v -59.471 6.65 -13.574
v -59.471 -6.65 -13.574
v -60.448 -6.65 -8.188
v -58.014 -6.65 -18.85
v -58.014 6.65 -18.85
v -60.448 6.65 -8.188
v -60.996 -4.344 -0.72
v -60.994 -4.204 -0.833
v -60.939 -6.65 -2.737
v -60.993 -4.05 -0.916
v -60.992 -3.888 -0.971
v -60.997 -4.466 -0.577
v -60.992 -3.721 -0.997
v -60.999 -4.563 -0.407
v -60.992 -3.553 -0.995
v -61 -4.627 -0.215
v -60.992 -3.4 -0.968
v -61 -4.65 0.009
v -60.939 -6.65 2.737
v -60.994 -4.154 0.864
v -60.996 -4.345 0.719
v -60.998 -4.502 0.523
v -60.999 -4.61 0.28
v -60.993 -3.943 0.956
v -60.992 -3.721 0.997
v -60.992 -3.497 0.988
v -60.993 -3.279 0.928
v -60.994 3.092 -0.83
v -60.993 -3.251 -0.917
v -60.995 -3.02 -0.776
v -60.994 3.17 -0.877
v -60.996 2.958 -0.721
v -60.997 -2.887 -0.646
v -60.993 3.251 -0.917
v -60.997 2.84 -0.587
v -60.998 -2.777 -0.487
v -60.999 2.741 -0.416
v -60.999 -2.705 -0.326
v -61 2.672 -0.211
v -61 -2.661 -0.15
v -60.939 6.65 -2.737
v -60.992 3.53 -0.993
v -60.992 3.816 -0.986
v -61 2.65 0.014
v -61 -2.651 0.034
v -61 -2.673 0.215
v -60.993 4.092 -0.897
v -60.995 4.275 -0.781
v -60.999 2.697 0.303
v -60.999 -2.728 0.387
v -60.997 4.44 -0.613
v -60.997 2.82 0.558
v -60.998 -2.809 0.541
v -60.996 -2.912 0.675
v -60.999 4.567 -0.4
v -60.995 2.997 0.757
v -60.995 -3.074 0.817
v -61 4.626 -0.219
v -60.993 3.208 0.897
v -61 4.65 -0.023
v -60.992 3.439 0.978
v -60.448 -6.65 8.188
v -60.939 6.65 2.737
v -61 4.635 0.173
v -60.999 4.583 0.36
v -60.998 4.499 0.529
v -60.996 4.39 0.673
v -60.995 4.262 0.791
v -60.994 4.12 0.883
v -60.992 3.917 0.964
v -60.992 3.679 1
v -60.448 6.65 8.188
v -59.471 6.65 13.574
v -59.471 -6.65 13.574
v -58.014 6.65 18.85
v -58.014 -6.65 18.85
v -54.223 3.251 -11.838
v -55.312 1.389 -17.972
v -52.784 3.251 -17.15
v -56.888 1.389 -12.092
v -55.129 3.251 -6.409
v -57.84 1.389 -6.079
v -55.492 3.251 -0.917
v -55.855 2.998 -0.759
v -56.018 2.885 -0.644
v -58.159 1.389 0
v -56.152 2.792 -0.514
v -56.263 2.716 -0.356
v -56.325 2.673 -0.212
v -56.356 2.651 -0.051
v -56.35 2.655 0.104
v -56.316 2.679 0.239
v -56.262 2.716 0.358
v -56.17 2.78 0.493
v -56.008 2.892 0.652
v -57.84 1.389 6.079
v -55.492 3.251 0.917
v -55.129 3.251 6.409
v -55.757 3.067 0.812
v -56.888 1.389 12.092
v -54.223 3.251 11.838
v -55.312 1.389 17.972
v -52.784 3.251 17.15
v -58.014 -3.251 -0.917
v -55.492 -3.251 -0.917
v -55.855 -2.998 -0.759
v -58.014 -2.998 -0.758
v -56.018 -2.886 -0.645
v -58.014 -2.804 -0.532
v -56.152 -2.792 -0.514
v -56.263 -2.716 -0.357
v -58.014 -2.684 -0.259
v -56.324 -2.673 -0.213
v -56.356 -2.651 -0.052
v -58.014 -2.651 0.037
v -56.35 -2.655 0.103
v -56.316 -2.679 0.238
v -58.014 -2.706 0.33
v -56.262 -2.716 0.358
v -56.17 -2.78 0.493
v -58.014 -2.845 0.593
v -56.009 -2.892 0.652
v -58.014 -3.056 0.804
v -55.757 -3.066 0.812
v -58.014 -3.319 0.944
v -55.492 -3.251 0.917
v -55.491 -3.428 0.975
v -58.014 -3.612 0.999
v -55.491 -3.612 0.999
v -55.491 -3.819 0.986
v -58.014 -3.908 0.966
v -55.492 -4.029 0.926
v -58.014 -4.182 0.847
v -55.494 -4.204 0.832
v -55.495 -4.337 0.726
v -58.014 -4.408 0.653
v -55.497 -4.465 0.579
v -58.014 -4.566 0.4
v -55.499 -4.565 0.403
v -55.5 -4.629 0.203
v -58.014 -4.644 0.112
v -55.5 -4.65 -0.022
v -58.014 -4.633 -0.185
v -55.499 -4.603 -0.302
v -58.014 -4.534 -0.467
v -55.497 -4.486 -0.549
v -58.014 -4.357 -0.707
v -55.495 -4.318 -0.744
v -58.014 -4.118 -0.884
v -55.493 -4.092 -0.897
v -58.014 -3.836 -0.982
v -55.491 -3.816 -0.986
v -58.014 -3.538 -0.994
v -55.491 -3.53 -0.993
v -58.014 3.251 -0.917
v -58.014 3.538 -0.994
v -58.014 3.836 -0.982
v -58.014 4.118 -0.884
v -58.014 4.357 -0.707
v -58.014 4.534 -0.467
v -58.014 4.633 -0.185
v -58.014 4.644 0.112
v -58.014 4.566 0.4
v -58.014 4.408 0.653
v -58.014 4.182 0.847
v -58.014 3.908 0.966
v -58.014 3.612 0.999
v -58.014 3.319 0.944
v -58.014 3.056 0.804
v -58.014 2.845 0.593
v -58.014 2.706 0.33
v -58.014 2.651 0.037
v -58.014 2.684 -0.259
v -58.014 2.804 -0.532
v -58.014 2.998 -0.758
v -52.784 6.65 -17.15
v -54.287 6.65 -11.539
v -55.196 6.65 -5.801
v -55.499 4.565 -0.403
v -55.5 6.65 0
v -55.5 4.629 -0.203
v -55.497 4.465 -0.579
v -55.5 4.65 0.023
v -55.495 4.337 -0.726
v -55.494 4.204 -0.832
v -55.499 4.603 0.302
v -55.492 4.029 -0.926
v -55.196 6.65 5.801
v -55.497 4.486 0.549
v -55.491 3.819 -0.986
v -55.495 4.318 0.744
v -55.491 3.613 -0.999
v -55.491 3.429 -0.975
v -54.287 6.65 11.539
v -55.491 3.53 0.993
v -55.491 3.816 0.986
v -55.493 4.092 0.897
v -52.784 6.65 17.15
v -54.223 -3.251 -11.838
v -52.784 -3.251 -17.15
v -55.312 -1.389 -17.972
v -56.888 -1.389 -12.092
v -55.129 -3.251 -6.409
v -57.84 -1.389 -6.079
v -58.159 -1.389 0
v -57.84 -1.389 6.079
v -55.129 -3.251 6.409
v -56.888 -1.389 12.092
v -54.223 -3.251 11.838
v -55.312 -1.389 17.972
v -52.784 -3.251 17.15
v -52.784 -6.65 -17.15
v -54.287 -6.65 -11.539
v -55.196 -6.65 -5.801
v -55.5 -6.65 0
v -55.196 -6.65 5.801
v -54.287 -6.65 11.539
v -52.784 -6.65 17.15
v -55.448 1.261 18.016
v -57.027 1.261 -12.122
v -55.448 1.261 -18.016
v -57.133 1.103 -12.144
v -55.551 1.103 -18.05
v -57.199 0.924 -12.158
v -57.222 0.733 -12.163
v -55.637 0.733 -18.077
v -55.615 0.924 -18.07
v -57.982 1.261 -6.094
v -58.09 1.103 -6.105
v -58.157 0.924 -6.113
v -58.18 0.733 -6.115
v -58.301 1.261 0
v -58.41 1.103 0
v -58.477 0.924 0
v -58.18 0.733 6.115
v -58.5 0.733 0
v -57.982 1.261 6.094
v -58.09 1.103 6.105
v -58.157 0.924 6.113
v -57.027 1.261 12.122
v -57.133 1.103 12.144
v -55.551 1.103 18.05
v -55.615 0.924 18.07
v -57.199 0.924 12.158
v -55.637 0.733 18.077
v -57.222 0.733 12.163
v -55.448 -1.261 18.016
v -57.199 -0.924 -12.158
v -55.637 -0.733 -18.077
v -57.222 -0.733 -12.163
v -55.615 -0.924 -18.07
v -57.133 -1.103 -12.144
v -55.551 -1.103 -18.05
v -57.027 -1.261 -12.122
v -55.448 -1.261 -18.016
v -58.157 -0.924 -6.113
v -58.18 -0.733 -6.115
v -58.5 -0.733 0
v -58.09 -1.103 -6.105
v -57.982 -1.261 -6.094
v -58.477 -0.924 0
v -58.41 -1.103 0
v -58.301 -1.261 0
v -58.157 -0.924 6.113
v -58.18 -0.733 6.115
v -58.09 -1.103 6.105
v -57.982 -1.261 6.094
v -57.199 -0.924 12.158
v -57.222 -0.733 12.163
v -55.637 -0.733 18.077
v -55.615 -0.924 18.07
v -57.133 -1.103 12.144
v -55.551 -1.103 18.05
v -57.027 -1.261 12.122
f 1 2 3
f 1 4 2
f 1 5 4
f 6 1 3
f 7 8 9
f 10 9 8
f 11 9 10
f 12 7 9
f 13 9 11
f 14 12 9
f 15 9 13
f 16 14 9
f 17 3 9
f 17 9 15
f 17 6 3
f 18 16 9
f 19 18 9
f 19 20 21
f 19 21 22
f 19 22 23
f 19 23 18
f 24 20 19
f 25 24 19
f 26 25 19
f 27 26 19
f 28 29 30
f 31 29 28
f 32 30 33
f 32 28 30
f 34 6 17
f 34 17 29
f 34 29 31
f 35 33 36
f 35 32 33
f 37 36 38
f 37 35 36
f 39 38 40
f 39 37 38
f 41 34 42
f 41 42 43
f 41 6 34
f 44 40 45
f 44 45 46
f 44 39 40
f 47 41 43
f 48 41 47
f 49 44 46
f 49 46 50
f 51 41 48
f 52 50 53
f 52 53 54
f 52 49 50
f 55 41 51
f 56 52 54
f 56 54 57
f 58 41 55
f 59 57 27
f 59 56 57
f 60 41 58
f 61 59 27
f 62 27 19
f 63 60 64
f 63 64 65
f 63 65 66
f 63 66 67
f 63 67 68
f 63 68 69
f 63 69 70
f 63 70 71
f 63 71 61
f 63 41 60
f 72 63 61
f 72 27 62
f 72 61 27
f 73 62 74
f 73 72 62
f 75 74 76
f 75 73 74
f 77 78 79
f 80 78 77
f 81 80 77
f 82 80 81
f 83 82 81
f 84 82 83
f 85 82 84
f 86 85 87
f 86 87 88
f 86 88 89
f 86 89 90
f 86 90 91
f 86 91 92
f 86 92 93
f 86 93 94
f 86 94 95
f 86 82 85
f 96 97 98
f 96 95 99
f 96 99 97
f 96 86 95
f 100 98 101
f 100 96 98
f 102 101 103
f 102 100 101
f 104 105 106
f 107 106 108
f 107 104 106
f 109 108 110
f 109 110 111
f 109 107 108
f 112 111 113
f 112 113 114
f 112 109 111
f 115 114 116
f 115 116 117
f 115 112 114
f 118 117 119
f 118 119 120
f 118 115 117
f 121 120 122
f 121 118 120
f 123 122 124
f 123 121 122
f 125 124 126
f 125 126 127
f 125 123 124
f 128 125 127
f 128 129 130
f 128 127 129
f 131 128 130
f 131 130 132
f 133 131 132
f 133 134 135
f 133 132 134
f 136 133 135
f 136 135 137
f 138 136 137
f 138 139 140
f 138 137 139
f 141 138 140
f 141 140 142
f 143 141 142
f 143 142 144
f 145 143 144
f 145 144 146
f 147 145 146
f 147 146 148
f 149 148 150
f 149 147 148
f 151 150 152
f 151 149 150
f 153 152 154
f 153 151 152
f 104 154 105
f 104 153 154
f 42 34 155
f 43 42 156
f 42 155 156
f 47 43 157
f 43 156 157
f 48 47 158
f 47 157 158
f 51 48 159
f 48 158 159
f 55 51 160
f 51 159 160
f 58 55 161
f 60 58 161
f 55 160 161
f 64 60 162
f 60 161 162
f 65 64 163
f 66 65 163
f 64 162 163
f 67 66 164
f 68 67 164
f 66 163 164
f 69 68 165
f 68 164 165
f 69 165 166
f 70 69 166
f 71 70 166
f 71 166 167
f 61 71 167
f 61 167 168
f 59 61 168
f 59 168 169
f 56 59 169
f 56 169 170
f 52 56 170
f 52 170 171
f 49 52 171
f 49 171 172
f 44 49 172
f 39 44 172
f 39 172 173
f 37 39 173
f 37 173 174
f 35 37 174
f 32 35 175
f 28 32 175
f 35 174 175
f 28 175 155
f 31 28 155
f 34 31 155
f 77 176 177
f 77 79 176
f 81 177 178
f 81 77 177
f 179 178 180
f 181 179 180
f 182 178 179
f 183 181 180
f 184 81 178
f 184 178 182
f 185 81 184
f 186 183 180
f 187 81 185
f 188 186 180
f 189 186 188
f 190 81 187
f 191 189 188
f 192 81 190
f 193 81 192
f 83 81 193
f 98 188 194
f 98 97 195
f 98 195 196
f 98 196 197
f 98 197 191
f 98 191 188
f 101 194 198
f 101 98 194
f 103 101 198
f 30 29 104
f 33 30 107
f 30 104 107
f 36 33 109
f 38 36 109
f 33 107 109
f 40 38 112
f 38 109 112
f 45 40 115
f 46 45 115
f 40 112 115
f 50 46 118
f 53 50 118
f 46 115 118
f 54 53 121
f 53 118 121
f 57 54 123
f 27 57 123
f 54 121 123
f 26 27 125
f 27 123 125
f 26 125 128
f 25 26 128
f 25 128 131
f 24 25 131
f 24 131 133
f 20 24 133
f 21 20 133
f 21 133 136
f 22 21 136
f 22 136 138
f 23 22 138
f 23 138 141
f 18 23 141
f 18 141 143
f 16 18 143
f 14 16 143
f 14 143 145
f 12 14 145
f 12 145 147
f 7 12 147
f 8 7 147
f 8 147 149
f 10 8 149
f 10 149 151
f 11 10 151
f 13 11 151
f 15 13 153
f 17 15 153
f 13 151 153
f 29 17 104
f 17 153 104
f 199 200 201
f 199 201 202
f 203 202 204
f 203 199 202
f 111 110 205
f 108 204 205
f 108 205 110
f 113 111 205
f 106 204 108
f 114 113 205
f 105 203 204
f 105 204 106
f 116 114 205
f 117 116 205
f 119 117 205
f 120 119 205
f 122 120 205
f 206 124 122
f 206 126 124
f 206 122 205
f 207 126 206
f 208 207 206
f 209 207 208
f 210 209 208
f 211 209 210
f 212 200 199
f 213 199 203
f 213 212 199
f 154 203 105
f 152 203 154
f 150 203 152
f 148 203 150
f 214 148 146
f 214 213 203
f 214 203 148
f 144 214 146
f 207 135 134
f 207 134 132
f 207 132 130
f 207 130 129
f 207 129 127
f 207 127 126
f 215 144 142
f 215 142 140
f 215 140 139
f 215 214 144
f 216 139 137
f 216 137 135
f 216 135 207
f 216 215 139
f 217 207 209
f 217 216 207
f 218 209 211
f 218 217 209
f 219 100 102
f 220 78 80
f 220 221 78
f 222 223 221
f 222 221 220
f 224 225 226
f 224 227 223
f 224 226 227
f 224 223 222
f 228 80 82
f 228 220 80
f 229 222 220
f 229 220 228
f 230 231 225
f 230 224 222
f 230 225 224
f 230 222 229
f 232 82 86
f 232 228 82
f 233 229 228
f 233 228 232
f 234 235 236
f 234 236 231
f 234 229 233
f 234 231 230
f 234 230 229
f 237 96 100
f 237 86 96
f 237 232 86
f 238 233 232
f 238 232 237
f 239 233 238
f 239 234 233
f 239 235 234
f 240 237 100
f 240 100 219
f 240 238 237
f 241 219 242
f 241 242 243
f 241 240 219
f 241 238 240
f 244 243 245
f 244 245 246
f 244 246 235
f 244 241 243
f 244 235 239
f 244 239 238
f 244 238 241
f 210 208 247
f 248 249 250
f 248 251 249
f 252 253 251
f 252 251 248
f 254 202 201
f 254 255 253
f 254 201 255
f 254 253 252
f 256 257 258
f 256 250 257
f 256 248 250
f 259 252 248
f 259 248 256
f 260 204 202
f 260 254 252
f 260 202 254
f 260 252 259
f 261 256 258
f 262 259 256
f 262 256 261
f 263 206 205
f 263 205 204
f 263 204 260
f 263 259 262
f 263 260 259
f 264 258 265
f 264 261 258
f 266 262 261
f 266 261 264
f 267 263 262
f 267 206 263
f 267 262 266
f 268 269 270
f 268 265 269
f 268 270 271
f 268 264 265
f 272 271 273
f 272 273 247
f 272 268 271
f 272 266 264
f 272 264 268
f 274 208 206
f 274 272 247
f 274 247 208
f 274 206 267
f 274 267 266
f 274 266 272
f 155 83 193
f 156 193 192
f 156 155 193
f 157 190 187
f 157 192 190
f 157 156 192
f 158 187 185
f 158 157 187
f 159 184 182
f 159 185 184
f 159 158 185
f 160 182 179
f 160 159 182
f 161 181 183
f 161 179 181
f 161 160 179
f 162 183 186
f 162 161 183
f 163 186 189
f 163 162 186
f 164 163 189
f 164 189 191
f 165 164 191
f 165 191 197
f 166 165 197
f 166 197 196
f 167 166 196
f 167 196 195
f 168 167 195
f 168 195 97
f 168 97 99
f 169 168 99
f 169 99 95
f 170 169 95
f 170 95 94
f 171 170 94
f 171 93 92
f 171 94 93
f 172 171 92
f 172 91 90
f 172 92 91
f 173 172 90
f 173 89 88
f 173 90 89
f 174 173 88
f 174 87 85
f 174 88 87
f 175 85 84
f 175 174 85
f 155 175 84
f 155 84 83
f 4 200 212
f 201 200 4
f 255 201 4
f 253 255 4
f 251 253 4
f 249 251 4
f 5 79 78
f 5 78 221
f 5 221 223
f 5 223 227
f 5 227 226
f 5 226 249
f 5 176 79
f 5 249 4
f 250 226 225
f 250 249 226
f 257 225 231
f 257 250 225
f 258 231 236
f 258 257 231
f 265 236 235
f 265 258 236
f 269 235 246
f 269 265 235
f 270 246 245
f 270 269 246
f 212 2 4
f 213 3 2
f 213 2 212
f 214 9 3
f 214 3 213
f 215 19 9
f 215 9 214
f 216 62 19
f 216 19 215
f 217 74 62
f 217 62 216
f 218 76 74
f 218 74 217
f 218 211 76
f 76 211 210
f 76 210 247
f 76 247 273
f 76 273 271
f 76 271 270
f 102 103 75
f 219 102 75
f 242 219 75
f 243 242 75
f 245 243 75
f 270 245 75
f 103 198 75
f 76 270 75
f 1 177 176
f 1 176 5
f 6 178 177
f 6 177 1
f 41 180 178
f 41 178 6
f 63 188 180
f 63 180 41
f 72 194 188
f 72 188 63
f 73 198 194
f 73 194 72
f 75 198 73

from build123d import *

# Parameters (mm, degrees)
ROTATION2_ANGLE                      = 36
SCHNITT_LINEAR_AUSTRAGEN2_DEPTH      = 3.4
SCHNITT_LINEAR_AUSTRAGEN2_DEPTH_BACK = 21.661746393
SKIZZE3_R                            = 1


with BuildPart() as part:
    # Skizze2 → Rotation2 (revolve, symmetric)
    with BuildSketch(Plane.XY) as rotation2_sk:
        with BuildLine():
            Line((-55.5, 3.250518846), (-58.158861149, 1.388764226))
            ThreePointArc((-58.158861149, 1.388764226), (-58.409608667, 1.102841481), (-58.5, 0.73344259))
            Line((-58.5, 0.73344259), (-58.5, -0.73344259))
            ThreePointArc((-58.5, -0.73344259), (-58.409608667, -1.102841481), (-58.158861149, -1.388764226))
            Line((-58.158861149, -1.388764226), (-55.5, -3.250518846))
            Line((-55.5, -3.250518846), (-55.5, -6.65))
            Line((-55.5, -6.65), (-61, -6.65))
            Line((-61, -6.65), (-61, 6.65))
            Line((-61, 6.65), (-55.5, 6.65))
            Line((-55.5, 6.65), (-55.5, 3.250518846))
        make_face()
    revolve(axis=Axis((0, 6.707883832, 0), (0, -1, 0)), revolution_arc=ROTATION2_ANGLE / 2)
    revolve(rotation2_sk.sketch, axis=Axis((0, 6.707883832, 0), (0, 1, 0)), revolution_arc=ROTATION2_ANGLE / 2)

    # Skizze3 → Schnitt-Linear austragen2 (cut, two sides: drawn at the far end of the back side and taken through both)
    with BuildSketch(Plane(origin=(-58.014447494, 0, 0), x_dir=(0, 0, -1), z_dir=(1, 0, 0)).offset(-SCHNITT_LINEAR_AUSTRAGEN2_DEPTH_BACK)):
        with Locations((0, 3.65)):
            Circle(SKIZZE3_R)
        with Locations((0, -3.65)):
            Circle(SKIZZE3_R)
    extrude(amount=SCHNITT_LINEAR_AUSTRAGEN2_DEPTH + SCHNITT_LINEAR_AUSTRAGEN2_DEPTH_BACK, mode=Mode.SUBTRACT)


solid = part.part
